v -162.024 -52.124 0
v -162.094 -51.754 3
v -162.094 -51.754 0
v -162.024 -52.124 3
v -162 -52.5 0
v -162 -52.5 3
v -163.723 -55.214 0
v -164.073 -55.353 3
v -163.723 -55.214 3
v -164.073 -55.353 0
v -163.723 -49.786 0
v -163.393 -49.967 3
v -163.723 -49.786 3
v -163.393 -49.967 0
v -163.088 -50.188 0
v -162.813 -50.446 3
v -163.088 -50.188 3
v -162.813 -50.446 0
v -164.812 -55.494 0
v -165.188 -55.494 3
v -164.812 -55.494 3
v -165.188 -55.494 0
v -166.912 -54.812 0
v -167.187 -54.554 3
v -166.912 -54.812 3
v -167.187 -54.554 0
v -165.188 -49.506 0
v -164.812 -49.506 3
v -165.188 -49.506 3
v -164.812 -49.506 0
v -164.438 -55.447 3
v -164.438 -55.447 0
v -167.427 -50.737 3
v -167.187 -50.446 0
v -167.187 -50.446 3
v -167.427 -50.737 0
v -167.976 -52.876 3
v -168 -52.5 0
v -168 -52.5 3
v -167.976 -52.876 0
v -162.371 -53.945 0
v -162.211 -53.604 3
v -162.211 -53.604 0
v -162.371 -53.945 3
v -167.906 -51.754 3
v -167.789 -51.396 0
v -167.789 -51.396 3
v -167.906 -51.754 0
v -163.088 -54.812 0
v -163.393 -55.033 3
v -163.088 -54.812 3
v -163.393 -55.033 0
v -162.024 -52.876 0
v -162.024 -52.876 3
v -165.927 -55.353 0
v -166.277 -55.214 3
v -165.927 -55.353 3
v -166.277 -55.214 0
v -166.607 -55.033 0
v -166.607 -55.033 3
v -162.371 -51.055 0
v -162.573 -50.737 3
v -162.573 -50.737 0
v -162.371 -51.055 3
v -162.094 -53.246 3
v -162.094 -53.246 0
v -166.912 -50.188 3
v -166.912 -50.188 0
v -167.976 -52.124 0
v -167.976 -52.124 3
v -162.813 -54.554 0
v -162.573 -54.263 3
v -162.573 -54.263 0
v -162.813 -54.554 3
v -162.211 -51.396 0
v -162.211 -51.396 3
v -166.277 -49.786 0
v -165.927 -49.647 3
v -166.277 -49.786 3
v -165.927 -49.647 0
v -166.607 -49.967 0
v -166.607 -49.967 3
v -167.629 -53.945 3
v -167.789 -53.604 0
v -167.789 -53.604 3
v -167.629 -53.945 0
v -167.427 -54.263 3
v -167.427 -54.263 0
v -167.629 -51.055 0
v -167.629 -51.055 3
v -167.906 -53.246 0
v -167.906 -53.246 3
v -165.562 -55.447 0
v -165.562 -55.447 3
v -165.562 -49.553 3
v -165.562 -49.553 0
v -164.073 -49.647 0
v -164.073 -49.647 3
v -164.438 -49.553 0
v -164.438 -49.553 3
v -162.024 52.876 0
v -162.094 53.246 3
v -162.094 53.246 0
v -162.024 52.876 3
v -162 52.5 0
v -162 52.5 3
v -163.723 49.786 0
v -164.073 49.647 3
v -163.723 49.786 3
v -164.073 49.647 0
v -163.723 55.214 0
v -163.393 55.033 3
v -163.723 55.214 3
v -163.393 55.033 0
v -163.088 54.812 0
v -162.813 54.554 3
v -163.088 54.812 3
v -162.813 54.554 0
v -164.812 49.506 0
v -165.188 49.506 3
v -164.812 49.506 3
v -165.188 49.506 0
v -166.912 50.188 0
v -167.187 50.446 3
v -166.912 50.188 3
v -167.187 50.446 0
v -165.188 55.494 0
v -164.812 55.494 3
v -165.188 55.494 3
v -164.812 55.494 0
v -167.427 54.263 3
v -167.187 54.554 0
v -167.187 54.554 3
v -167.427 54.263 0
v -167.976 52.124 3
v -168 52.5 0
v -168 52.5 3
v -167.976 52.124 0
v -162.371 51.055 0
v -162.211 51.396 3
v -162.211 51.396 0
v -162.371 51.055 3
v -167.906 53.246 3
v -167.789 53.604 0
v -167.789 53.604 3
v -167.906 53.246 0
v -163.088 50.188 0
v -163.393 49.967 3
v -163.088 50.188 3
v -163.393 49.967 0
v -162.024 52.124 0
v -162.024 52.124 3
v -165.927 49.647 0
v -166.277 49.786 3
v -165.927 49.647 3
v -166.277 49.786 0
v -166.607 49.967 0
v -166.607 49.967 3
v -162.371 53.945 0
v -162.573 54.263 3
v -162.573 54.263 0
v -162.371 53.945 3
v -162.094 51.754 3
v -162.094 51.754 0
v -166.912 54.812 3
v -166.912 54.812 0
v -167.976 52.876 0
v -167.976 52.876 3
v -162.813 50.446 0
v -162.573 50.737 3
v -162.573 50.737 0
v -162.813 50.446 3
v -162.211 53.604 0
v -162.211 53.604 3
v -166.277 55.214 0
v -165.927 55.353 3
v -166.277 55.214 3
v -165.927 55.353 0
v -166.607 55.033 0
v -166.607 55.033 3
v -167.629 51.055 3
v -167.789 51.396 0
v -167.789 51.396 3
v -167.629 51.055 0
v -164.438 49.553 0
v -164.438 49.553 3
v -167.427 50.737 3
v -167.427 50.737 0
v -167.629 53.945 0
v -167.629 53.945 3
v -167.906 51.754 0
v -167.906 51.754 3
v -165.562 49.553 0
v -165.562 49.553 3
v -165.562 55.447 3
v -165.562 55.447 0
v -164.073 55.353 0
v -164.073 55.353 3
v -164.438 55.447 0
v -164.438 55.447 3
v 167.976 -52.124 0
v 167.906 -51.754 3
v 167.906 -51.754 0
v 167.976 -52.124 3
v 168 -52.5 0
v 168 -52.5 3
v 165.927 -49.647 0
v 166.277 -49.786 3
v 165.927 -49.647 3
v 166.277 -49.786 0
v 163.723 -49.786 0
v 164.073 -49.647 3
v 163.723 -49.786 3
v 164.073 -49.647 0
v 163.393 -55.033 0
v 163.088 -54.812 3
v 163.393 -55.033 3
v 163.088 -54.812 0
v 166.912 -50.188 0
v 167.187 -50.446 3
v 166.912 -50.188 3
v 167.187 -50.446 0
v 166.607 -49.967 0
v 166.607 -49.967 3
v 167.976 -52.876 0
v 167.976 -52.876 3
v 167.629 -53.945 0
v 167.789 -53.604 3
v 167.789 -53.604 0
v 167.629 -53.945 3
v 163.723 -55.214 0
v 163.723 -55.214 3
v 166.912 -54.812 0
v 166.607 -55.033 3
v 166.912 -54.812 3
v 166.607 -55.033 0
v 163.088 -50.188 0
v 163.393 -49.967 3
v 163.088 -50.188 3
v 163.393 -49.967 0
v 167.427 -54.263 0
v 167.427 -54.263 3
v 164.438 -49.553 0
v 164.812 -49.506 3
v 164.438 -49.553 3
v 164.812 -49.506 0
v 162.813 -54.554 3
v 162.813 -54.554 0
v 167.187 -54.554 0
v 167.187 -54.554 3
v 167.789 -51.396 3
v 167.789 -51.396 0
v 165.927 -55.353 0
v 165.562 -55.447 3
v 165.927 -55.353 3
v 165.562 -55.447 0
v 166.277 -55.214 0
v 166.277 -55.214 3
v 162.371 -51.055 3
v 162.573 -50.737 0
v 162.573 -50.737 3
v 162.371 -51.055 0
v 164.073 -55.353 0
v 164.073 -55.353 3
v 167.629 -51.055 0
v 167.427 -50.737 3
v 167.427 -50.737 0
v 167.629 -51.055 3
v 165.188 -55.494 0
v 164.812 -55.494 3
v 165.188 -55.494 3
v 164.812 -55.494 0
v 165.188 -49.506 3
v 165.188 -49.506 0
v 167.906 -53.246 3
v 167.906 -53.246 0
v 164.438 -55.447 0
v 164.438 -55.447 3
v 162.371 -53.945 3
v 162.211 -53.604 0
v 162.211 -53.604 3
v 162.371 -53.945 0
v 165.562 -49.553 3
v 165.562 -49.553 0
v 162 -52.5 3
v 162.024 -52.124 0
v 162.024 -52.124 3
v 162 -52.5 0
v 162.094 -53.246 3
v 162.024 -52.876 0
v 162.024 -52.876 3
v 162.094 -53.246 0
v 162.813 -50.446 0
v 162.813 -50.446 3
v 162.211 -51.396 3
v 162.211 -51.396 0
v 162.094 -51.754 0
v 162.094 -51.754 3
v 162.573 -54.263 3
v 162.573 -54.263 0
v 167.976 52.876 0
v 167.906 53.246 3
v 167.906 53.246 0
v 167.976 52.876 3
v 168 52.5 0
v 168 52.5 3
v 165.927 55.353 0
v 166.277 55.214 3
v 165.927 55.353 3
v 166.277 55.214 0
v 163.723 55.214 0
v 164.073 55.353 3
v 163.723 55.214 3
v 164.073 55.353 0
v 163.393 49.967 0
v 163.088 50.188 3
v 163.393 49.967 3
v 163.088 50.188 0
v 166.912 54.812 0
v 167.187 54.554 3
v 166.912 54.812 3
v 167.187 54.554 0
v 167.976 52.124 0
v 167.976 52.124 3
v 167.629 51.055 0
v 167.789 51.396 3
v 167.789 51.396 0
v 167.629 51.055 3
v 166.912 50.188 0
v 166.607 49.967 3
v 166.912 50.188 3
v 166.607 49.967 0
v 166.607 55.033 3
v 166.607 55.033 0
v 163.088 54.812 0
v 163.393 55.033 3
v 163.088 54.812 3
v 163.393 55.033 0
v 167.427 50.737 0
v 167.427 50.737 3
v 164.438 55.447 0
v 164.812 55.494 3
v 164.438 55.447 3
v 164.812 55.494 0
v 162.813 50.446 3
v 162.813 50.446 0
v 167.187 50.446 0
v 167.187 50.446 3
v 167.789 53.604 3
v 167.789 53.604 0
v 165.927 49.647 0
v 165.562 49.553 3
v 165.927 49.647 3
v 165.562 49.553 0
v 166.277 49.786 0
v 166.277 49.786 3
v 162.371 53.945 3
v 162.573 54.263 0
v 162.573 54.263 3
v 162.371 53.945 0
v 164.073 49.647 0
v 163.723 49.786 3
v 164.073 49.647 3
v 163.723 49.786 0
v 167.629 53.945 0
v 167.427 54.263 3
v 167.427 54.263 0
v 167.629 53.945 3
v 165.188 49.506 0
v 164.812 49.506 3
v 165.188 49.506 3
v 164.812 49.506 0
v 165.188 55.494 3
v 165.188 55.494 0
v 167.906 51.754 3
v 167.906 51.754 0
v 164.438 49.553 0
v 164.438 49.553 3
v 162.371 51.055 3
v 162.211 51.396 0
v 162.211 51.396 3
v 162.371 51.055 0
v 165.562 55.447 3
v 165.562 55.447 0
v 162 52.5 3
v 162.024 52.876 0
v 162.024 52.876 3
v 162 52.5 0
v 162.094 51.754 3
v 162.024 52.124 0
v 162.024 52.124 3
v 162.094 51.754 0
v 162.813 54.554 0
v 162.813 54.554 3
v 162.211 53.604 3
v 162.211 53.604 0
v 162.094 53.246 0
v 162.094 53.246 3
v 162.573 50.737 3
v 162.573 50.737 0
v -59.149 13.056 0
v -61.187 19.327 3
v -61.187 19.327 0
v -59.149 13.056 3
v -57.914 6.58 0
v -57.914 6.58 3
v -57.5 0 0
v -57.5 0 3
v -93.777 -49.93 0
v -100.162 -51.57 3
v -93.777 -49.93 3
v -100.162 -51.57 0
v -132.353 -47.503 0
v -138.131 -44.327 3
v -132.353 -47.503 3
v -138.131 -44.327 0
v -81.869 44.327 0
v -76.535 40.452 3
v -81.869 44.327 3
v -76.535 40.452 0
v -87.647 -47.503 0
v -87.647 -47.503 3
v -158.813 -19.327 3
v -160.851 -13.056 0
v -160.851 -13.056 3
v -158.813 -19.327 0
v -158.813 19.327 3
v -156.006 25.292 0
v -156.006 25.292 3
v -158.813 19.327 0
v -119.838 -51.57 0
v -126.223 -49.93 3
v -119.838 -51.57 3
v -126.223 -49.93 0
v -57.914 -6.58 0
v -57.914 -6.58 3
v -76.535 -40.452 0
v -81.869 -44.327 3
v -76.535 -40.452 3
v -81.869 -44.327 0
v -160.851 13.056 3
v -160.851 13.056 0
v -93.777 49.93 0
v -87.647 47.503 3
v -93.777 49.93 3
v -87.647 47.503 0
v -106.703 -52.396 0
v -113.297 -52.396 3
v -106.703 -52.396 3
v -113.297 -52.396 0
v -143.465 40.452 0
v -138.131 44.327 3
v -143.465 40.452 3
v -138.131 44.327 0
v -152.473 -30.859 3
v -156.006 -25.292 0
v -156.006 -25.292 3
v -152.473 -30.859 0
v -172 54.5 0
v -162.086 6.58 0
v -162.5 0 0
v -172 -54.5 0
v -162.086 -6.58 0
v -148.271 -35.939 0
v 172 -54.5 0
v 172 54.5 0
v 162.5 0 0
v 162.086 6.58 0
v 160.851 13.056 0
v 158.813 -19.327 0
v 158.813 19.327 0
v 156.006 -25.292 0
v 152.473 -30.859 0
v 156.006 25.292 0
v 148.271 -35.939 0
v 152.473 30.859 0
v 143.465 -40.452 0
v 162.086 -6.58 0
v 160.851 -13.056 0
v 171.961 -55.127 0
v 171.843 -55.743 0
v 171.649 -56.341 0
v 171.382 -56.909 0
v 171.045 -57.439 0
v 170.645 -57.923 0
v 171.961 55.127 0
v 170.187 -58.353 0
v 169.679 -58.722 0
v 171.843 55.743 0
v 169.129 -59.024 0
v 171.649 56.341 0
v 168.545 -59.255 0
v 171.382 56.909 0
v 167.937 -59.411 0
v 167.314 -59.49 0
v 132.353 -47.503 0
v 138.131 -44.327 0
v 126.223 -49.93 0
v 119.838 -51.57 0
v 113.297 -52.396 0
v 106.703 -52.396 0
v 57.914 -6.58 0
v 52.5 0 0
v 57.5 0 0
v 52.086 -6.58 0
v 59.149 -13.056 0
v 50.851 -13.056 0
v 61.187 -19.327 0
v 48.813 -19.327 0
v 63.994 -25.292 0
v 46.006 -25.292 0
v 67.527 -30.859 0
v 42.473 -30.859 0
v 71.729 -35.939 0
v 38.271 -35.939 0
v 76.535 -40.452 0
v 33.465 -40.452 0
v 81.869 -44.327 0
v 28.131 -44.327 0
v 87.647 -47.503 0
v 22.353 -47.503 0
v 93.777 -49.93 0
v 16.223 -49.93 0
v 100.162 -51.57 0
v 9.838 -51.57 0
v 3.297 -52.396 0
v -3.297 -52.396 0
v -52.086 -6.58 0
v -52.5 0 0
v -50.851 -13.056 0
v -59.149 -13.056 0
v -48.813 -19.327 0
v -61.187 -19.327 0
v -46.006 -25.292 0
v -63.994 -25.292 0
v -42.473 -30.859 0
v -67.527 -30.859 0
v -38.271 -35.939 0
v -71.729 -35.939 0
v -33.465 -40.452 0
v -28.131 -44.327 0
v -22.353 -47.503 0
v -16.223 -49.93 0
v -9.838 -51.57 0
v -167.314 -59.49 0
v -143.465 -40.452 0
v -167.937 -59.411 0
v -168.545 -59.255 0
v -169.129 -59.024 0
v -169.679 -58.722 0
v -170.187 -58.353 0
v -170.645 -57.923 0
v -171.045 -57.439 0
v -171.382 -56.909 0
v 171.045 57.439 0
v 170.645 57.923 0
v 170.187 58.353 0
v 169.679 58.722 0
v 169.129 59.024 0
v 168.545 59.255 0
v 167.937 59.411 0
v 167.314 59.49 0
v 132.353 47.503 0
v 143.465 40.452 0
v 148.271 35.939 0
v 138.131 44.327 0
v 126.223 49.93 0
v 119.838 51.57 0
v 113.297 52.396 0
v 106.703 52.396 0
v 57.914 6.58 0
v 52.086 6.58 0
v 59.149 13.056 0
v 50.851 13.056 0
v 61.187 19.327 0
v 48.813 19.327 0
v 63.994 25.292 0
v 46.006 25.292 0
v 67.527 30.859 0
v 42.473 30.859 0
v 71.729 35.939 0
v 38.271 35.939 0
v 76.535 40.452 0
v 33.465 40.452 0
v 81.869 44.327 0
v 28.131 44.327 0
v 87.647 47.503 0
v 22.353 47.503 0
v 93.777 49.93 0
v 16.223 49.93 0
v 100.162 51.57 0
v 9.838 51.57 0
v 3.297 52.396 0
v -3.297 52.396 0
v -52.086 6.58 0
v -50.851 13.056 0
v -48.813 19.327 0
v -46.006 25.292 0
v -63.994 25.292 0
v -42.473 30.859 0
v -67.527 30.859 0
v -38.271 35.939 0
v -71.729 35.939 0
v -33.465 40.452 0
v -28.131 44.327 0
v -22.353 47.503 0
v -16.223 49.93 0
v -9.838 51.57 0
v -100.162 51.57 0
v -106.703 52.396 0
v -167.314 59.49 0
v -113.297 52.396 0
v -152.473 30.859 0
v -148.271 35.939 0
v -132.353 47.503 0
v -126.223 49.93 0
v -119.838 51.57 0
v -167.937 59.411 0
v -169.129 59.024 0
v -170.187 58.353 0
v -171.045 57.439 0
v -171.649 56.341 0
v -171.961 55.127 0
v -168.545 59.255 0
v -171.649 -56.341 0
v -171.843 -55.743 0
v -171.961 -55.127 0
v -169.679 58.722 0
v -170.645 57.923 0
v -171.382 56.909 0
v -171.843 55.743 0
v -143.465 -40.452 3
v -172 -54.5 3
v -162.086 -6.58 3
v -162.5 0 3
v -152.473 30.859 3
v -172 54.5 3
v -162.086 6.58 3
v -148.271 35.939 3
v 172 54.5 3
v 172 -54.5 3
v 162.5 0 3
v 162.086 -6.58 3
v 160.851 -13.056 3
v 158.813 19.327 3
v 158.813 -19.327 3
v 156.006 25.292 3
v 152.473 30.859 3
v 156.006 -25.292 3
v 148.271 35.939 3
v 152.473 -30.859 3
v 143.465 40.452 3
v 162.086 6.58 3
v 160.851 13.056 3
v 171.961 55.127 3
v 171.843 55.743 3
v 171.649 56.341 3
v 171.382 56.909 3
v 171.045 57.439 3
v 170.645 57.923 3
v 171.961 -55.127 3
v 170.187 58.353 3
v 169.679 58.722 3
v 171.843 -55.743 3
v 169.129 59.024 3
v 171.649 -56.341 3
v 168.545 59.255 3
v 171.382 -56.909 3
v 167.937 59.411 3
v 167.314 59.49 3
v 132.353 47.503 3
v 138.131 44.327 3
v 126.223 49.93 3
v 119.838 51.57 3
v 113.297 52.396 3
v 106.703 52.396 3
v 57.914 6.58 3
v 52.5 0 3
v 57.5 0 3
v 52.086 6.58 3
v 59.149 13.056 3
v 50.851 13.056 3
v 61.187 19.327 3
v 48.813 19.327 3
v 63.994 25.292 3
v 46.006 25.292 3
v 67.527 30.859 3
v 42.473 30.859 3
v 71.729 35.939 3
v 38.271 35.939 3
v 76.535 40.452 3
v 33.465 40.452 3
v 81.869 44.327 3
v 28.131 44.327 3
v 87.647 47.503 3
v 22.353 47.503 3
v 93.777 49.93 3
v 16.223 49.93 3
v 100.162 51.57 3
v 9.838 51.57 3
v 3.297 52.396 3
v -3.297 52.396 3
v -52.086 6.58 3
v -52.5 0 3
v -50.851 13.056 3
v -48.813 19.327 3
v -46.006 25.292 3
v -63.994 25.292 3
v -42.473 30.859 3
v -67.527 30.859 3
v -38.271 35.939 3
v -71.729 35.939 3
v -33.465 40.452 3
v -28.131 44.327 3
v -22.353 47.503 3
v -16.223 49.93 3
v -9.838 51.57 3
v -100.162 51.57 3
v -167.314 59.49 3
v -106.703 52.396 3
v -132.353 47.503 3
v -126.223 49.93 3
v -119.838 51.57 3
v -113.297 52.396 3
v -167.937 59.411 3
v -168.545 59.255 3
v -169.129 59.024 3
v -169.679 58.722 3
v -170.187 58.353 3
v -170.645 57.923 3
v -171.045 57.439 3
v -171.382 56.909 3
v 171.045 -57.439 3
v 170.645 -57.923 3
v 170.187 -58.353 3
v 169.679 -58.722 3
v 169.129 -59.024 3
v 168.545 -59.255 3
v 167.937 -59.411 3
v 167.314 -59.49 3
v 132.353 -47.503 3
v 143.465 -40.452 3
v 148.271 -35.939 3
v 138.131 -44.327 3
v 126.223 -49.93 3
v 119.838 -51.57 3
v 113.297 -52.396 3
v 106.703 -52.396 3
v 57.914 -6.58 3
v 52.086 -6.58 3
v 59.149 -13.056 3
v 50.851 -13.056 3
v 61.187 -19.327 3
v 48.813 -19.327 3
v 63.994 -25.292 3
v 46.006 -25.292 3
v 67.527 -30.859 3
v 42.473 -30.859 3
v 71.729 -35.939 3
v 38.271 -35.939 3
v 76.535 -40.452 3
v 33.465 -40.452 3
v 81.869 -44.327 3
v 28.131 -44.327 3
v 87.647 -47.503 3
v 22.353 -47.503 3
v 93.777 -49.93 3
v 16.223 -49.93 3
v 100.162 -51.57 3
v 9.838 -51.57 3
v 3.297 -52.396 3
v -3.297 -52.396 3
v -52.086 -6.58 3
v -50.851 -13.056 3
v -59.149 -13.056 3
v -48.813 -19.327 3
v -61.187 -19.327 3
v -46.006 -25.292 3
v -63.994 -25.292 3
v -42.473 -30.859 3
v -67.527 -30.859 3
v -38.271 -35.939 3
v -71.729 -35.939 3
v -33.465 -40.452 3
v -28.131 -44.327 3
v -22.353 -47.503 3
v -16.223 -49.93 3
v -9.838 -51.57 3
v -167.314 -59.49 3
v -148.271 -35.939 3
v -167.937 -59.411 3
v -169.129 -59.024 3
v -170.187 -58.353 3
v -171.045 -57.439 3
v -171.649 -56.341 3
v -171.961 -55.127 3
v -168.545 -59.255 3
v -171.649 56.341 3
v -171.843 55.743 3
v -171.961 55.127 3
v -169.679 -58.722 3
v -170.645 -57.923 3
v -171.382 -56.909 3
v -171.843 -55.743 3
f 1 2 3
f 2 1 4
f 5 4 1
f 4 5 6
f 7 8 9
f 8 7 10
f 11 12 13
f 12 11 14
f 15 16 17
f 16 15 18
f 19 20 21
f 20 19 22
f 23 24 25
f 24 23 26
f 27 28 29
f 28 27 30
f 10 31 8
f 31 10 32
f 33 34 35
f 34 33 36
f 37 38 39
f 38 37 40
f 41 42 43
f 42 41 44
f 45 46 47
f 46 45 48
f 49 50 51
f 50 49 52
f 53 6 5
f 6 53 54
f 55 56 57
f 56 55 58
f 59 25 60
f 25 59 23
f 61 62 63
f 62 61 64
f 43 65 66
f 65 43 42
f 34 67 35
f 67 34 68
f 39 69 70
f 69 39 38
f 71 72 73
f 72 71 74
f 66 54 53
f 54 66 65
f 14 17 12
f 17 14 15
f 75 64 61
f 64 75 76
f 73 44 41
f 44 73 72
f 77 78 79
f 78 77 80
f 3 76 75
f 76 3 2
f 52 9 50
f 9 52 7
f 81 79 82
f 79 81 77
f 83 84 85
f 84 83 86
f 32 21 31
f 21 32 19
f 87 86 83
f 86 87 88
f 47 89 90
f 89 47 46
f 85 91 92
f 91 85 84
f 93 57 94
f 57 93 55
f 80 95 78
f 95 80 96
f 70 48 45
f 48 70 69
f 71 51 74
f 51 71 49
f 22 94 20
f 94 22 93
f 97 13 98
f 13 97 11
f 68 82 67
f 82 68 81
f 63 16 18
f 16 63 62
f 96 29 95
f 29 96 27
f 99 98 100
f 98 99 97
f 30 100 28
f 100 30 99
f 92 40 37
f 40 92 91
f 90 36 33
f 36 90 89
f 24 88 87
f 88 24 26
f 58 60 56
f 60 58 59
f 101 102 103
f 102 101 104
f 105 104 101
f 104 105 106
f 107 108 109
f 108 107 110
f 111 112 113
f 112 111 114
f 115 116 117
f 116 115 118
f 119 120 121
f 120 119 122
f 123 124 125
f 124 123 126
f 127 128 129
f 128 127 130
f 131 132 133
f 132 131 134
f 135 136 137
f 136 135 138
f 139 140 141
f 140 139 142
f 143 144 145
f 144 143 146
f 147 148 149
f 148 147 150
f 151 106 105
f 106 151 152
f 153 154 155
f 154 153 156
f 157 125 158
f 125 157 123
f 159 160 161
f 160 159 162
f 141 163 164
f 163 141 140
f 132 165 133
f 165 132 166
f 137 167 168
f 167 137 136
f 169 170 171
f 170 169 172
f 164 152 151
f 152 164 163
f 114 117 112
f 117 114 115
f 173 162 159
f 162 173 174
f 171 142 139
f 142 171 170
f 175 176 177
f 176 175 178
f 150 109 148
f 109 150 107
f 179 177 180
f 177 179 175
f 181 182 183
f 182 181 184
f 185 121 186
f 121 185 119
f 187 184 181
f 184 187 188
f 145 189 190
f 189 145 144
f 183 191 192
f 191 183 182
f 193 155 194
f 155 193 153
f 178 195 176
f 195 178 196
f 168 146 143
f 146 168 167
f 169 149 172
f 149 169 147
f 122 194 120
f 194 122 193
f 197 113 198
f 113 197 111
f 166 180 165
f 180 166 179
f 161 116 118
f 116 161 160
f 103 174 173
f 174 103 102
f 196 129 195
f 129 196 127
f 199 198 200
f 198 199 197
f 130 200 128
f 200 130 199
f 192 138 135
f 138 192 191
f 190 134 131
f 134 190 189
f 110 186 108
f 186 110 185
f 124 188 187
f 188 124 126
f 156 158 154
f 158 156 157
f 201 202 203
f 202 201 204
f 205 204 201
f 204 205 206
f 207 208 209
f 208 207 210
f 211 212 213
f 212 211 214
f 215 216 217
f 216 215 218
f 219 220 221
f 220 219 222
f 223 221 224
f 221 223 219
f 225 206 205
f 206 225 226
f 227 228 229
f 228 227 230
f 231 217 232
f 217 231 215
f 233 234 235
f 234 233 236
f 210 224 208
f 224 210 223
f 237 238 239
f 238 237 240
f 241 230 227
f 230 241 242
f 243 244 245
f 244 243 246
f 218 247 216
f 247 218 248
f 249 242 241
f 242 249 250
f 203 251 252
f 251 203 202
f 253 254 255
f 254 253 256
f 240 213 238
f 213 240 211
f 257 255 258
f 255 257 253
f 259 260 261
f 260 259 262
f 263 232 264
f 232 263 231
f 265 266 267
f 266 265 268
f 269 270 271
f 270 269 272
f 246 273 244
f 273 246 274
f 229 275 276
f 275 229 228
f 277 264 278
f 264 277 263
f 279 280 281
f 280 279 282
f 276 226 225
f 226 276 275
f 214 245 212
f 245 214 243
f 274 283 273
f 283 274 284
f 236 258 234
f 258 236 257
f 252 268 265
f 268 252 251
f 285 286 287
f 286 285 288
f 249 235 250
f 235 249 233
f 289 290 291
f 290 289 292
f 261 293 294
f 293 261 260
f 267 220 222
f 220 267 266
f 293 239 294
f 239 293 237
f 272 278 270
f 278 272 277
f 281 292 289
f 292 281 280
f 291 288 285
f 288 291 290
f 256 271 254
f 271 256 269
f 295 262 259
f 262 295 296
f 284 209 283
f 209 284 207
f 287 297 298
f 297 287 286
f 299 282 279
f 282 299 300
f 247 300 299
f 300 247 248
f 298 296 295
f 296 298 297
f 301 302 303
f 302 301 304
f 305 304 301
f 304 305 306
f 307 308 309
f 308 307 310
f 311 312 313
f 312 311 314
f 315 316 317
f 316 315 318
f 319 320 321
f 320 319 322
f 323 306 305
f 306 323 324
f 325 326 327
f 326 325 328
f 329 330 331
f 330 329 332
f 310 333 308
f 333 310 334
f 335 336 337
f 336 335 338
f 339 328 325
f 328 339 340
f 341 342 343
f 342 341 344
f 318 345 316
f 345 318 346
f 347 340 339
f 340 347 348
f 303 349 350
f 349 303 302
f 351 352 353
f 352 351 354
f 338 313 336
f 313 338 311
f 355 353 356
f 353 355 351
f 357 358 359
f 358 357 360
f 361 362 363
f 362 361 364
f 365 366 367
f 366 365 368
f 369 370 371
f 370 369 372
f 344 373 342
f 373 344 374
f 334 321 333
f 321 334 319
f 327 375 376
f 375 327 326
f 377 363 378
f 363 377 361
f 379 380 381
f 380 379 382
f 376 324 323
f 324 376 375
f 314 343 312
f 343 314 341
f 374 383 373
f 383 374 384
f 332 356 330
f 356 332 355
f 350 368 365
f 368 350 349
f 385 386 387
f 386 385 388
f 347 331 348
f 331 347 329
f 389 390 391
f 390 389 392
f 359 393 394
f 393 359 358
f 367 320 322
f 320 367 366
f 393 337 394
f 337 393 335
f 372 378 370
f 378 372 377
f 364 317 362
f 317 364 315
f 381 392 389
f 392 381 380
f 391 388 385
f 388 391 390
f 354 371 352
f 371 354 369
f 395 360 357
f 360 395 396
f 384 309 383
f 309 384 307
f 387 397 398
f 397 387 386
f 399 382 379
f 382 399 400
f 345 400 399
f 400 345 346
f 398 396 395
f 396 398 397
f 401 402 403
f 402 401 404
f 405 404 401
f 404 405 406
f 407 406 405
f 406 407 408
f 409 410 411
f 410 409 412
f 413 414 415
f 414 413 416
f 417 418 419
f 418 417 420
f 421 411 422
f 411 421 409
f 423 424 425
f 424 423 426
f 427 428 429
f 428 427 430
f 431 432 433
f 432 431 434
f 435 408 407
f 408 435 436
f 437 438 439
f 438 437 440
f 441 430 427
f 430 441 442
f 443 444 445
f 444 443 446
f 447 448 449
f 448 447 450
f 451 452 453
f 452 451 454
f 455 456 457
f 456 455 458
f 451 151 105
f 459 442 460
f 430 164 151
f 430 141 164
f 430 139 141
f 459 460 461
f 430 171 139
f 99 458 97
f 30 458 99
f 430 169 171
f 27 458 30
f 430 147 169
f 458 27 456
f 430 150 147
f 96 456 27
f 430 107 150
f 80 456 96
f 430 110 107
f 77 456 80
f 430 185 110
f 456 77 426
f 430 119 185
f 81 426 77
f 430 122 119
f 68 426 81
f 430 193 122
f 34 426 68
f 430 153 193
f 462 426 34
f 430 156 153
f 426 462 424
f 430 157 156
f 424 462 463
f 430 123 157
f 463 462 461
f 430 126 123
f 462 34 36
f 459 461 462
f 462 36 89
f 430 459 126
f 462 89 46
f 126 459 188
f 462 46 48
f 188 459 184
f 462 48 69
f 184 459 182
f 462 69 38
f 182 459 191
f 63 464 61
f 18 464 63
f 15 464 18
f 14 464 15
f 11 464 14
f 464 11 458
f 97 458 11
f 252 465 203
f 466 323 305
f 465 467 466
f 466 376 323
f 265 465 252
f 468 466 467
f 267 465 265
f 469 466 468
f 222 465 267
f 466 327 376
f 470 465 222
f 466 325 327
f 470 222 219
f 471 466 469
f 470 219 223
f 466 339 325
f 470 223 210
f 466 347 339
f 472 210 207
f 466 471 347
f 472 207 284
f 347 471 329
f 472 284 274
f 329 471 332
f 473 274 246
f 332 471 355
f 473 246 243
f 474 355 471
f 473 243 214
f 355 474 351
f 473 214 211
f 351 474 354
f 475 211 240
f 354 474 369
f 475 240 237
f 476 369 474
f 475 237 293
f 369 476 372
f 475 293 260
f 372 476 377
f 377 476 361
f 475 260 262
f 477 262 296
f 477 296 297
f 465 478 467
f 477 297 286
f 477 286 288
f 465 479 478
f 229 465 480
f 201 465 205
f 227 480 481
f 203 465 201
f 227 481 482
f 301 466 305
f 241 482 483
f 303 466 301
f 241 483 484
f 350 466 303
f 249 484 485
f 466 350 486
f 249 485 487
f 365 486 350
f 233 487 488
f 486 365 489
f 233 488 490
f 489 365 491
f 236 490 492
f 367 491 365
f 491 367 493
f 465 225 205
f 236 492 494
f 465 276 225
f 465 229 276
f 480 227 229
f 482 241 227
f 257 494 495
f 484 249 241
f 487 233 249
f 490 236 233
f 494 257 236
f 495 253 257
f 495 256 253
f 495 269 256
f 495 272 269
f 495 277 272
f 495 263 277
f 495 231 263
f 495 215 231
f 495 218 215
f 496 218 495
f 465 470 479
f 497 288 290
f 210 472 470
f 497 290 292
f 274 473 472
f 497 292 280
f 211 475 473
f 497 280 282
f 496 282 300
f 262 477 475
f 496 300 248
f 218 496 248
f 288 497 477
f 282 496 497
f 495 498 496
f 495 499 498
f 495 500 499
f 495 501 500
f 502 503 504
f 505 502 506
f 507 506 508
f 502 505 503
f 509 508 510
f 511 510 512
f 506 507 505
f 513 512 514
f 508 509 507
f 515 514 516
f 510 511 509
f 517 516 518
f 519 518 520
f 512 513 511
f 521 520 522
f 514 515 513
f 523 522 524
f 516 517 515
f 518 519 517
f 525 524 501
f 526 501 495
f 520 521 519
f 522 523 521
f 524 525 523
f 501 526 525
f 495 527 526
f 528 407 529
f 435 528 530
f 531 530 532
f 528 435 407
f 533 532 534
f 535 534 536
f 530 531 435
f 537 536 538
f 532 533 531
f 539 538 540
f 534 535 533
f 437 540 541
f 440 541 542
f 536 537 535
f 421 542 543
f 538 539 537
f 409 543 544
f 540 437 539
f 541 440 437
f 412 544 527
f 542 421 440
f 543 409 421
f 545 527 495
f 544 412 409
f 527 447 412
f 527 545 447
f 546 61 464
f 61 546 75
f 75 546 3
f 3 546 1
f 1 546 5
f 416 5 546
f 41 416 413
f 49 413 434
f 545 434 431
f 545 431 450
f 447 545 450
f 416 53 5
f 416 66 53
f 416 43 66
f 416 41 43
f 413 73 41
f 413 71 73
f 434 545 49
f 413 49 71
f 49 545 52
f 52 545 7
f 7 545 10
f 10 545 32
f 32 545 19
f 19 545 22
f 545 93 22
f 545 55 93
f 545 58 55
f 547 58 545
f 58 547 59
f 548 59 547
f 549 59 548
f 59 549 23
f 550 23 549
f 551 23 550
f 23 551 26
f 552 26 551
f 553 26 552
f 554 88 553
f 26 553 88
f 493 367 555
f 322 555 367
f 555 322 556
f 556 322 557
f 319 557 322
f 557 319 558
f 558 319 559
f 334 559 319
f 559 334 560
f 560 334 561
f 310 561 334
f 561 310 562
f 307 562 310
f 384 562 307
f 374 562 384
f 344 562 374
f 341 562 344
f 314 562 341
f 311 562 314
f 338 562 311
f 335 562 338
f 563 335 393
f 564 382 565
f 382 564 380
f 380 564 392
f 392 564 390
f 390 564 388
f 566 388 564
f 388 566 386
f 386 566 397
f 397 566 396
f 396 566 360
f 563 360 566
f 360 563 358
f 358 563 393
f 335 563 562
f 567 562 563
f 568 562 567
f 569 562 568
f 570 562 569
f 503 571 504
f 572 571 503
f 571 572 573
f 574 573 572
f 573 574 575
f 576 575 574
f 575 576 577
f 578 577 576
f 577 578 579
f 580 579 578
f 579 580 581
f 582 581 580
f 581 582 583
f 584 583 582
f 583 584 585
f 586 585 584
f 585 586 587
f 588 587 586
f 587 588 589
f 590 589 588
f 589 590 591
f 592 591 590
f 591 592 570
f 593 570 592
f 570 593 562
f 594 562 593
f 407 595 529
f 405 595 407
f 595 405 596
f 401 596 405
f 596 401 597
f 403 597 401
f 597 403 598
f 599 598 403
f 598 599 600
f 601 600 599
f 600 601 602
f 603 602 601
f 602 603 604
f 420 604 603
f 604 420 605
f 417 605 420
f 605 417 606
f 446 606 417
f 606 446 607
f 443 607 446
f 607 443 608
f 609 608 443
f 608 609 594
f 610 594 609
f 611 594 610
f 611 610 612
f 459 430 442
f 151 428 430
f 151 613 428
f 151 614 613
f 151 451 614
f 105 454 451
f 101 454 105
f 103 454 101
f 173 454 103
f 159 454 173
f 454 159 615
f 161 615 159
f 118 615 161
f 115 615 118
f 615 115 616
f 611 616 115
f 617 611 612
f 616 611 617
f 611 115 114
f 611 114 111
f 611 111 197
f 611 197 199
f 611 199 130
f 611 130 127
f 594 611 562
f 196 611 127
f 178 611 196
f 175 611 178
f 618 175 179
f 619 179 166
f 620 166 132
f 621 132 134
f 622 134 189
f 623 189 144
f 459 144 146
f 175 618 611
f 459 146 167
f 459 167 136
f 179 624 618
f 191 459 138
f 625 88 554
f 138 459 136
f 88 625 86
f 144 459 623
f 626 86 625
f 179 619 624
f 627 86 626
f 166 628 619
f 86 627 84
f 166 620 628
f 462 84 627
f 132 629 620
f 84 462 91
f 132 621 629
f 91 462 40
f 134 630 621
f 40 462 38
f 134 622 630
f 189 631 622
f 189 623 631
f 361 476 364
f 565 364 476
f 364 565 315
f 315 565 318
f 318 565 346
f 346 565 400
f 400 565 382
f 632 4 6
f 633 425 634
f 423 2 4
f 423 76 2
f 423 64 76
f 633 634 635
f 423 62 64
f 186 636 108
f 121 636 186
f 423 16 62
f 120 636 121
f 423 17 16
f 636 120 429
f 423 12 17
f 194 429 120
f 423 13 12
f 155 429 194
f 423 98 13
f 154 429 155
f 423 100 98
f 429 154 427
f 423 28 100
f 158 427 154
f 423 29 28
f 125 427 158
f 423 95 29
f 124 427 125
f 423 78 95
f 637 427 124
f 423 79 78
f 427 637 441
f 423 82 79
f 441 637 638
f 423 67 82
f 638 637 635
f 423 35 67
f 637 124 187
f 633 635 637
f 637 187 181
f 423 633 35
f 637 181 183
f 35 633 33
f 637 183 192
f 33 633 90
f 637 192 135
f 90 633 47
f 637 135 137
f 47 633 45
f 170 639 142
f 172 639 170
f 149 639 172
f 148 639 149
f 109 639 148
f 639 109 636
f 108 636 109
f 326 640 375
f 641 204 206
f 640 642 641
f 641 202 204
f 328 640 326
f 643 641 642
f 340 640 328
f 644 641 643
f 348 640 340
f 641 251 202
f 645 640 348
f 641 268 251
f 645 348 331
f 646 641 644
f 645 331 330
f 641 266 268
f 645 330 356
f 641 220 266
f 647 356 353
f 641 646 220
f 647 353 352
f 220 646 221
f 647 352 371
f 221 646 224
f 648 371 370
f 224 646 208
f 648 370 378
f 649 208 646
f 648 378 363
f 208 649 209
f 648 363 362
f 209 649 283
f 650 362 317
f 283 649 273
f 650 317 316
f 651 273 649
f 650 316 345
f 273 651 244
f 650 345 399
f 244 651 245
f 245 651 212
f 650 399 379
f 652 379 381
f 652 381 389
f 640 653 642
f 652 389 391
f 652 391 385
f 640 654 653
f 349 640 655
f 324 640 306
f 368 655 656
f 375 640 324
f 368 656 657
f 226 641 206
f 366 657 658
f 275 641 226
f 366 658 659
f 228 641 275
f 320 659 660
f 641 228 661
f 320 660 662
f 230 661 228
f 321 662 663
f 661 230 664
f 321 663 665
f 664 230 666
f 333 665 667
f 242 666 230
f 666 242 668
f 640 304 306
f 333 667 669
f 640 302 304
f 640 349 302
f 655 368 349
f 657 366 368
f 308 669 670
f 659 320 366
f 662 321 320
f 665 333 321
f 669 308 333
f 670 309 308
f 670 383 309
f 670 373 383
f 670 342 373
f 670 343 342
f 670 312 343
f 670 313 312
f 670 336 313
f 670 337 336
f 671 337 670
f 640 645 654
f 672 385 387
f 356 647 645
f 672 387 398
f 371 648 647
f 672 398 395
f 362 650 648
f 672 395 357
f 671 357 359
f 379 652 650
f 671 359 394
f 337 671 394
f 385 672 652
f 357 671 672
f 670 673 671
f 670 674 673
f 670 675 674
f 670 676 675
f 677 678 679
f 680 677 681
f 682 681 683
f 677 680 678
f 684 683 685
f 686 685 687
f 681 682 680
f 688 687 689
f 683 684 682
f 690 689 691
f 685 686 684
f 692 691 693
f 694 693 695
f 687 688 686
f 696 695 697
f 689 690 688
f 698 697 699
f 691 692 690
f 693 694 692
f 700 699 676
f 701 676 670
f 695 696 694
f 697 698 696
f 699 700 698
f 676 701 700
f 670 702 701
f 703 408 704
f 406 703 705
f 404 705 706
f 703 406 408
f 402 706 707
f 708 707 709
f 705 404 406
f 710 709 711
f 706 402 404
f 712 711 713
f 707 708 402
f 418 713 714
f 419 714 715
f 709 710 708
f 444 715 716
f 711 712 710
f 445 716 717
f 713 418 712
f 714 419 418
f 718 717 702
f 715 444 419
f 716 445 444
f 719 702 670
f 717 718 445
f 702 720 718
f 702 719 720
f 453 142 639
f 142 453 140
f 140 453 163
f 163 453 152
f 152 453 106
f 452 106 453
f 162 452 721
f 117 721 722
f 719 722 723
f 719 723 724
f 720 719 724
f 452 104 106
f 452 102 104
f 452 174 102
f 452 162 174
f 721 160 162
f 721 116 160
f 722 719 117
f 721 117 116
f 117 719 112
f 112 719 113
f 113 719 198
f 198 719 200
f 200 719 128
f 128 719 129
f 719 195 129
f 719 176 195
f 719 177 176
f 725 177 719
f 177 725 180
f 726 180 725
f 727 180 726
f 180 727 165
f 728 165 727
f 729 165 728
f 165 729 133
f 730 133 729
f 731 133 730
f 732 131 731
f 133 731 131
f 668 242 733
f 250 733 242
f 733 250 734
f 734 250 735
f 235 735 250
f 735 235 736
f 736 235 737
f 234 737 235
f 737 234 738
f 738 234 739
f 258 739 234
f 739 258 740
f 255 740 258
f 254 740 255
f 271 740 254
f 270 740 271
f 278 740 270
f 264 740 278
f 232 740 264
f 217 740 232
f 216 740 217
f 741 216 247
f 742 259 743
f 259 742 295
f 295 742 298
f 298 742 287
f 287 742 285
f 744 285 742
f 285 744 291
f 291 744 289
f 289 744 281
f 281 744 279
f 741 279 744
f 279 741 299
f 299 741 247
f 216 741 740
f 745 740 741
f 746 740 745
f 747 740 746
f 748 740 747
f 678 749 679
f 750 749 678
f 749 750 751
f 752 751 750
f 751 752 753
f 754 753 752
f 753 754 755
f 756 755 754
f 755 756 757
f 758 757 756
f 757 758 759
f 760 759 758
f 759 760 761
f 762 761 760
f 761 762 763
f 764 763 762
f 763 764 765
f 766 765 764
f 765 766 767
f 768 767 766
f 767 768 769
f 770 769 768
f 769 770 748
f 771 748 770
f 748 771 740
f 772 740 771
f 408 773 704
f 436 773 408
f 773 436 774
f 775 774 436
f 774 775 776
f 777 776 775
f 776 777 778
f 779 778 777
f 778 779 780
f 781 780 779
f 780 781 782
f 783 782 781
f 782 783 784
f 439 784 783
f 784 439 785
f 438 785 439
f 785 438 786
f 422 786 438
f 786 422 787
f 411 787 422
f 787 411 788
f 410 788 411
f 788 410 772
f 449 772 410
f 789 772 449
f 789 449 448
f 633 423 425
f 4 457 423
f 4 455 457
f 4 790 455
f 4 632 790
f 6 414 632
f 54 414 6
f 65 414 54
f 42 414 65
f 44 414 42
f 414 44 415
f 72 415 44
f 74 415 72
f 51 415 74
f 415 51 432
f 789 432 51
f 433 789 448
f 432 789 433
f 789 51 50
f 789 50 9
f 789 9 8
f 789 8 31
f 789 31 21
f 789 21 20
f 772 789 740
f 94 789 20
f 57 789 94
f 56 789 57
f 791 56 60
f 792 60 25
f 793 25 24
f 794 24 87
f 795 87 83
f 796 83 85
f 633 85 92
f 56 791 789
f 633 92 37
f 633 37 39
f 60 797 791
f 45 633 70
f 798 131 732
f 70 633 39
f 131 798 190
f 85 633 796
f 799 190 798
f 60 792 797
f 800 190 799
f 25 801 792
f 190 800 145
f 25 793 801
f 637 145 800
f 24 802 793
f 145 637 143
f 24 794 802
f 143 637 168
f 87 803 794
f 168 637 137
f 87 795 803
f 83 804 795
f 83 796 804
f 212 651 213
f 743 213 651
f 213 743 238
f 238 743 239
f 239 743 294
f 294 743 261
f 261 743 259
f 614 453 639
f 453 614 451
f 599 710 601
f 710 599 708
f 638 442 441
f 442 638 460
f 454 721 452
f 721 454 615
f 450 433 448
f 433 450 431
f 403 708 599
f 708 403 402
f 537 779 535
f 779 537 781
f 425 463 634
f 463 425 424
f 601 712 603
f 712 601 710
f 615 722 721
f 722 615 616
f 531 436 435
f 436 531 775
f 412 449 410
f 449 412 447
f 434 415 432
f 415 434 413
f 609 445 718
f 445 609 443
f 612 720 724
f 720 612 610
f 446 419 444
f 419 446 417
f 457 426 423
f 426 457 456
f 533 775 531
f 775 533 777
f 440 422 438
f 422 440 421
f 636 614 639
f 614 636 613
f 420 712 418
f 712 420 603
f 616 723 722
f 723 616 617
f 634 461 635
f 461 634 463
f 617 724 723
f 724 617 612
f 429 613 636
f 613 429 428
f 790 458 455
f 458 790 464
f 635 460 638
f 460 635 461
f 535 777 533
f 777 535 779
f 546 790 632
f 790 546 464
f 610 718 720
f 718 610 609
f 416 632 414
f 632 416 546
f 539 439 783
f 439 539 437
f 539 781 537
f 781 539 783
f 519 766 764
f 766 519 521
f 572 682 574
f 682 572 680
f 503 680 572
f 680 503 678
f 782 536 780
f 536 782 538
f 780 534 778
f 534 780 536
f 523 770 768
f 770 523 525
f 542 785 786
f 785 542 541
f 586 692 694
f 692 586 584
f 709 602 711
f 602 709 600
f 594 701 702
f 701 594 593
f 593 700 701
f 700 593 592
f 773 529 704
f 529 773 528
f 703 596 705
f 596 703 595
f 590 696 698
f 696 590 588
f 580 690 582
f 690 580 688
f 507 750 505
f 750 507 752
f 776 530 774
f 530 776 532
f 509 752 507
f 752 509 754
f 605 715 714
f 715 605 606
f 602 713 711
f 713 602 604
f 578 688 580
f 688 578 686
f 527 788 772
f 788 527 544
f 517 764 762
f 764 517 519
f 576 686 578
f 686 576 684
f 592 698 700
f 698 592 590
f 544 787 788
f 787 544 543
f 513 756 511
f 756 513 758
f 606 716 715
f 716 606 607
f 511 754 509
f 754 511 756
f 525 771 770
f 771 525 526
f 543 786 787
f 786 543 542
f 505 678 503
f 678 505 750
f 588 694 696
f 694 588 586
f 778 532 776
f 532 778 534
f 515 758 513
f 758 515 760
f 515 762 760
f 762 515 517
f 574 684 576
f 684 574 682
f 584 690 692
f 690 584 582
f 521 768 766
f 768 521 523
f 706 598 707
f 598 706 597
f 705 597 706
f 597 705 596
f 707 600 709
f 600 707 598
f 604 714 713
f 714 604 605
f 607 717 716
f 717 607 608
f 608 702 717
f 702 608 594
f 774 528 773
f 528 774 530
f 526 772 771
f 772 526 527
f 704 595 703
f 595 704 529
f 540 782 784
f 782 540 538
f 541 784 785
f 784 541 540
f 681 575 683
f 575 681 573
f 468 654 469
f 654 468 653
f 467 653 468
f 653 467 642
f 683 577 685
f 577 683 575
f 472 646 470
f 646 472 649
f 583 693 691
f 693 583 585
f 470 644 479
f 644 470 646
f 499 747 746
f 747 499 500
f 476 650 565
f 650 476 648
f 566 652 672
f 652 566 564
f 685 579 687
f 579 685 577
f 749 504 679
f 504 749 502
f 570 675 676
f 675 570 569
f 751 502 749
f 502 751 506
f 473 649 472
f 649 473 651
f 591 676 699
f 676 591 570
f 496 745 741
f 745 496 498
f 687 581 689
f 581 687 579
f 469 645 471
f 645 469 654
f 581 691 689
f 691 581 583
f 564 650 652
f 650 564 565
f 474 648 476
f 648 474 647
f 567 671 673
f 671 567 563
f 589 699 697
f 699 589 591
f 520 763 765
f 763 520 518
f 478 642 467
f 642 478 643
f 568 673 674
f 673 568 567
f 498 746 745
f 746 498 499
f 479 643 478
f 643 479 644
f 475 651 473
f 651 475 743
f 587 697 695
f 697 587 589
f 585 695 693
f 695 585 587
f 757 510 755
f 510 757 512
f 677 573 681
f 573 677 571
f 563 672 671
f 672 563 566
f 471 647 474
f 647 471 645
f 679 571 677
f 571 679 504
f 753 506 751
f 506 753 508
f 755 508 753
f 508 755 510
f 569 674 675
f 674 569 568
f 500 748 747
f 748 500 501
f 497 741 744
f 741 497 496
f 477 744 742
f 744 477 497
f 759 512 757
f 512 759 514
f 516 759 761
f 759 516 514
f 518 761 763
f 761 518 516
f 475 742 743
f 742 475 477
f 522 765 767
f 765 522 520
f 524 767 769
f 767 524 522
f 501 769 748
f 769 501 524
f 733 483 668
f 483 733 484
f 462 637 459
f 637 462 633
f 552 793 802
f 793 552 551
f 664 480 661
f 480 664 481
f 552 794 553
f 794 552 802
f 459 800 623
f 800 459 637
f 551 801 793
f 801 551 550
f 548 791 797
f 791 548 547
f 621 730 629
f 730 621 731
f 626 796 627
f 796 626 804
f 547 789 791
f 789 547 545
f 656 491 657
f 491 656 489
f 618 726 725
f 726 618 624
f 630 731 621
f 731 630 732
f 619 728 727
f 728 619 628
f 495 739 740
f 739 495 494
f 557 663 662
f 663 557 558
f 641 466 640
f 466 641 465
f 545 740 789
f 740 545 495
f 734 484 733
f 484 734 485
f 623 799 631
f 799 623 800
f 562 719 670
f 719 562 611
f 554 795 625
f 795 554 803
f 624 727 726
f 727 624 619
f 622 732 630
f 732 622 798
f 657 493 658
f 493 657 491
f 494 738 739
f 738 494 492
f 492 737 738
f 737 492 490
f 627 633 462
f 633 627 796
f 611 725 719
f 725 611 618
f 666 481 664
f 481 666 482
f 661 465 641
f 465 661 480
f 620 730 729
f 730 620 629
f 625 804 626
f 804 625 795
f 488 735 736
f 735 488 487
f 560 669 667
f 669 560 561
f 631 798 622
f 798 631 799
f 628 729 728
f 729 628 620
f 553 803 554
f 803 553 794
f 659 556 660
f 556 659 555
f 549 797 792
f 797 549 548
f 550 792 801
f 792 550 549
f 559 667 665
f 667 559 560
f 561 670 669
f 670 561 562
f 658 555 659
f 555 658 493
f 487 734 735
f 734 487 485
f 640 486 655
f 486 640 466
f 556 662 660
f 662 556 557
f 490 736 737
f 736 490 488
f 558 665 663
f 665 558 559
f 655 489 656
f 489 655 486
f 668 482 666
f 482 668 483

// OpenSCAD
$fn = 50;


difference() {
	union() {
		hull() {
			translate(v = [-167.0000000000, 54.5000000000, 0]) {
				cylinder(h = 3, r = 5);
			}
			translate(v = [167.0000000000, 54.5000000000, 0]) {
				cylinder(h = 3, r = 5);
			}
			translate(v = [-167.0000000000, -54.5000000000, 0]) {
				cylinder(h = 3, r = 5);
			}
			translate(v = [167.0000000000, -54.5000000000, 0]) {
				cylinder(h = 3, r = 5);
			}
		}
	}
	union() {
		#translate(v = [-165.0000000000, -52.5000000000, -100.0000000000]) {
			cylinder(h = 200, r = 3.0000000000);
		}
		#translate(v = [-165.0000000000, 52.5000000000, -100.0000000000]) {
			cylinder(h = 200, r = 3.0000000000);
		}
		#translate(v = [165.0000000000, -52.5000000000, -100.0000000000]) {
			cylinder(h = 200, r = 3.0000000000);
		}
		#translate(v = [165.0000000000, 52.5000000000, -100.0000000000]) {
			cylinder(h = 200, r = 3.0000000000);
		}
		#translate(v = [-110.0000000000, 0, 0]) {
			cylinder(h = 3, r = 52.5000000000);
		}
		#cylinder(h = 3, r = 52.5000000000);
		#translate(v = [110.0000000000, 0, 0]) {
			cylinder(h = 3, r = 52.5000000000);
		}
	}
}
